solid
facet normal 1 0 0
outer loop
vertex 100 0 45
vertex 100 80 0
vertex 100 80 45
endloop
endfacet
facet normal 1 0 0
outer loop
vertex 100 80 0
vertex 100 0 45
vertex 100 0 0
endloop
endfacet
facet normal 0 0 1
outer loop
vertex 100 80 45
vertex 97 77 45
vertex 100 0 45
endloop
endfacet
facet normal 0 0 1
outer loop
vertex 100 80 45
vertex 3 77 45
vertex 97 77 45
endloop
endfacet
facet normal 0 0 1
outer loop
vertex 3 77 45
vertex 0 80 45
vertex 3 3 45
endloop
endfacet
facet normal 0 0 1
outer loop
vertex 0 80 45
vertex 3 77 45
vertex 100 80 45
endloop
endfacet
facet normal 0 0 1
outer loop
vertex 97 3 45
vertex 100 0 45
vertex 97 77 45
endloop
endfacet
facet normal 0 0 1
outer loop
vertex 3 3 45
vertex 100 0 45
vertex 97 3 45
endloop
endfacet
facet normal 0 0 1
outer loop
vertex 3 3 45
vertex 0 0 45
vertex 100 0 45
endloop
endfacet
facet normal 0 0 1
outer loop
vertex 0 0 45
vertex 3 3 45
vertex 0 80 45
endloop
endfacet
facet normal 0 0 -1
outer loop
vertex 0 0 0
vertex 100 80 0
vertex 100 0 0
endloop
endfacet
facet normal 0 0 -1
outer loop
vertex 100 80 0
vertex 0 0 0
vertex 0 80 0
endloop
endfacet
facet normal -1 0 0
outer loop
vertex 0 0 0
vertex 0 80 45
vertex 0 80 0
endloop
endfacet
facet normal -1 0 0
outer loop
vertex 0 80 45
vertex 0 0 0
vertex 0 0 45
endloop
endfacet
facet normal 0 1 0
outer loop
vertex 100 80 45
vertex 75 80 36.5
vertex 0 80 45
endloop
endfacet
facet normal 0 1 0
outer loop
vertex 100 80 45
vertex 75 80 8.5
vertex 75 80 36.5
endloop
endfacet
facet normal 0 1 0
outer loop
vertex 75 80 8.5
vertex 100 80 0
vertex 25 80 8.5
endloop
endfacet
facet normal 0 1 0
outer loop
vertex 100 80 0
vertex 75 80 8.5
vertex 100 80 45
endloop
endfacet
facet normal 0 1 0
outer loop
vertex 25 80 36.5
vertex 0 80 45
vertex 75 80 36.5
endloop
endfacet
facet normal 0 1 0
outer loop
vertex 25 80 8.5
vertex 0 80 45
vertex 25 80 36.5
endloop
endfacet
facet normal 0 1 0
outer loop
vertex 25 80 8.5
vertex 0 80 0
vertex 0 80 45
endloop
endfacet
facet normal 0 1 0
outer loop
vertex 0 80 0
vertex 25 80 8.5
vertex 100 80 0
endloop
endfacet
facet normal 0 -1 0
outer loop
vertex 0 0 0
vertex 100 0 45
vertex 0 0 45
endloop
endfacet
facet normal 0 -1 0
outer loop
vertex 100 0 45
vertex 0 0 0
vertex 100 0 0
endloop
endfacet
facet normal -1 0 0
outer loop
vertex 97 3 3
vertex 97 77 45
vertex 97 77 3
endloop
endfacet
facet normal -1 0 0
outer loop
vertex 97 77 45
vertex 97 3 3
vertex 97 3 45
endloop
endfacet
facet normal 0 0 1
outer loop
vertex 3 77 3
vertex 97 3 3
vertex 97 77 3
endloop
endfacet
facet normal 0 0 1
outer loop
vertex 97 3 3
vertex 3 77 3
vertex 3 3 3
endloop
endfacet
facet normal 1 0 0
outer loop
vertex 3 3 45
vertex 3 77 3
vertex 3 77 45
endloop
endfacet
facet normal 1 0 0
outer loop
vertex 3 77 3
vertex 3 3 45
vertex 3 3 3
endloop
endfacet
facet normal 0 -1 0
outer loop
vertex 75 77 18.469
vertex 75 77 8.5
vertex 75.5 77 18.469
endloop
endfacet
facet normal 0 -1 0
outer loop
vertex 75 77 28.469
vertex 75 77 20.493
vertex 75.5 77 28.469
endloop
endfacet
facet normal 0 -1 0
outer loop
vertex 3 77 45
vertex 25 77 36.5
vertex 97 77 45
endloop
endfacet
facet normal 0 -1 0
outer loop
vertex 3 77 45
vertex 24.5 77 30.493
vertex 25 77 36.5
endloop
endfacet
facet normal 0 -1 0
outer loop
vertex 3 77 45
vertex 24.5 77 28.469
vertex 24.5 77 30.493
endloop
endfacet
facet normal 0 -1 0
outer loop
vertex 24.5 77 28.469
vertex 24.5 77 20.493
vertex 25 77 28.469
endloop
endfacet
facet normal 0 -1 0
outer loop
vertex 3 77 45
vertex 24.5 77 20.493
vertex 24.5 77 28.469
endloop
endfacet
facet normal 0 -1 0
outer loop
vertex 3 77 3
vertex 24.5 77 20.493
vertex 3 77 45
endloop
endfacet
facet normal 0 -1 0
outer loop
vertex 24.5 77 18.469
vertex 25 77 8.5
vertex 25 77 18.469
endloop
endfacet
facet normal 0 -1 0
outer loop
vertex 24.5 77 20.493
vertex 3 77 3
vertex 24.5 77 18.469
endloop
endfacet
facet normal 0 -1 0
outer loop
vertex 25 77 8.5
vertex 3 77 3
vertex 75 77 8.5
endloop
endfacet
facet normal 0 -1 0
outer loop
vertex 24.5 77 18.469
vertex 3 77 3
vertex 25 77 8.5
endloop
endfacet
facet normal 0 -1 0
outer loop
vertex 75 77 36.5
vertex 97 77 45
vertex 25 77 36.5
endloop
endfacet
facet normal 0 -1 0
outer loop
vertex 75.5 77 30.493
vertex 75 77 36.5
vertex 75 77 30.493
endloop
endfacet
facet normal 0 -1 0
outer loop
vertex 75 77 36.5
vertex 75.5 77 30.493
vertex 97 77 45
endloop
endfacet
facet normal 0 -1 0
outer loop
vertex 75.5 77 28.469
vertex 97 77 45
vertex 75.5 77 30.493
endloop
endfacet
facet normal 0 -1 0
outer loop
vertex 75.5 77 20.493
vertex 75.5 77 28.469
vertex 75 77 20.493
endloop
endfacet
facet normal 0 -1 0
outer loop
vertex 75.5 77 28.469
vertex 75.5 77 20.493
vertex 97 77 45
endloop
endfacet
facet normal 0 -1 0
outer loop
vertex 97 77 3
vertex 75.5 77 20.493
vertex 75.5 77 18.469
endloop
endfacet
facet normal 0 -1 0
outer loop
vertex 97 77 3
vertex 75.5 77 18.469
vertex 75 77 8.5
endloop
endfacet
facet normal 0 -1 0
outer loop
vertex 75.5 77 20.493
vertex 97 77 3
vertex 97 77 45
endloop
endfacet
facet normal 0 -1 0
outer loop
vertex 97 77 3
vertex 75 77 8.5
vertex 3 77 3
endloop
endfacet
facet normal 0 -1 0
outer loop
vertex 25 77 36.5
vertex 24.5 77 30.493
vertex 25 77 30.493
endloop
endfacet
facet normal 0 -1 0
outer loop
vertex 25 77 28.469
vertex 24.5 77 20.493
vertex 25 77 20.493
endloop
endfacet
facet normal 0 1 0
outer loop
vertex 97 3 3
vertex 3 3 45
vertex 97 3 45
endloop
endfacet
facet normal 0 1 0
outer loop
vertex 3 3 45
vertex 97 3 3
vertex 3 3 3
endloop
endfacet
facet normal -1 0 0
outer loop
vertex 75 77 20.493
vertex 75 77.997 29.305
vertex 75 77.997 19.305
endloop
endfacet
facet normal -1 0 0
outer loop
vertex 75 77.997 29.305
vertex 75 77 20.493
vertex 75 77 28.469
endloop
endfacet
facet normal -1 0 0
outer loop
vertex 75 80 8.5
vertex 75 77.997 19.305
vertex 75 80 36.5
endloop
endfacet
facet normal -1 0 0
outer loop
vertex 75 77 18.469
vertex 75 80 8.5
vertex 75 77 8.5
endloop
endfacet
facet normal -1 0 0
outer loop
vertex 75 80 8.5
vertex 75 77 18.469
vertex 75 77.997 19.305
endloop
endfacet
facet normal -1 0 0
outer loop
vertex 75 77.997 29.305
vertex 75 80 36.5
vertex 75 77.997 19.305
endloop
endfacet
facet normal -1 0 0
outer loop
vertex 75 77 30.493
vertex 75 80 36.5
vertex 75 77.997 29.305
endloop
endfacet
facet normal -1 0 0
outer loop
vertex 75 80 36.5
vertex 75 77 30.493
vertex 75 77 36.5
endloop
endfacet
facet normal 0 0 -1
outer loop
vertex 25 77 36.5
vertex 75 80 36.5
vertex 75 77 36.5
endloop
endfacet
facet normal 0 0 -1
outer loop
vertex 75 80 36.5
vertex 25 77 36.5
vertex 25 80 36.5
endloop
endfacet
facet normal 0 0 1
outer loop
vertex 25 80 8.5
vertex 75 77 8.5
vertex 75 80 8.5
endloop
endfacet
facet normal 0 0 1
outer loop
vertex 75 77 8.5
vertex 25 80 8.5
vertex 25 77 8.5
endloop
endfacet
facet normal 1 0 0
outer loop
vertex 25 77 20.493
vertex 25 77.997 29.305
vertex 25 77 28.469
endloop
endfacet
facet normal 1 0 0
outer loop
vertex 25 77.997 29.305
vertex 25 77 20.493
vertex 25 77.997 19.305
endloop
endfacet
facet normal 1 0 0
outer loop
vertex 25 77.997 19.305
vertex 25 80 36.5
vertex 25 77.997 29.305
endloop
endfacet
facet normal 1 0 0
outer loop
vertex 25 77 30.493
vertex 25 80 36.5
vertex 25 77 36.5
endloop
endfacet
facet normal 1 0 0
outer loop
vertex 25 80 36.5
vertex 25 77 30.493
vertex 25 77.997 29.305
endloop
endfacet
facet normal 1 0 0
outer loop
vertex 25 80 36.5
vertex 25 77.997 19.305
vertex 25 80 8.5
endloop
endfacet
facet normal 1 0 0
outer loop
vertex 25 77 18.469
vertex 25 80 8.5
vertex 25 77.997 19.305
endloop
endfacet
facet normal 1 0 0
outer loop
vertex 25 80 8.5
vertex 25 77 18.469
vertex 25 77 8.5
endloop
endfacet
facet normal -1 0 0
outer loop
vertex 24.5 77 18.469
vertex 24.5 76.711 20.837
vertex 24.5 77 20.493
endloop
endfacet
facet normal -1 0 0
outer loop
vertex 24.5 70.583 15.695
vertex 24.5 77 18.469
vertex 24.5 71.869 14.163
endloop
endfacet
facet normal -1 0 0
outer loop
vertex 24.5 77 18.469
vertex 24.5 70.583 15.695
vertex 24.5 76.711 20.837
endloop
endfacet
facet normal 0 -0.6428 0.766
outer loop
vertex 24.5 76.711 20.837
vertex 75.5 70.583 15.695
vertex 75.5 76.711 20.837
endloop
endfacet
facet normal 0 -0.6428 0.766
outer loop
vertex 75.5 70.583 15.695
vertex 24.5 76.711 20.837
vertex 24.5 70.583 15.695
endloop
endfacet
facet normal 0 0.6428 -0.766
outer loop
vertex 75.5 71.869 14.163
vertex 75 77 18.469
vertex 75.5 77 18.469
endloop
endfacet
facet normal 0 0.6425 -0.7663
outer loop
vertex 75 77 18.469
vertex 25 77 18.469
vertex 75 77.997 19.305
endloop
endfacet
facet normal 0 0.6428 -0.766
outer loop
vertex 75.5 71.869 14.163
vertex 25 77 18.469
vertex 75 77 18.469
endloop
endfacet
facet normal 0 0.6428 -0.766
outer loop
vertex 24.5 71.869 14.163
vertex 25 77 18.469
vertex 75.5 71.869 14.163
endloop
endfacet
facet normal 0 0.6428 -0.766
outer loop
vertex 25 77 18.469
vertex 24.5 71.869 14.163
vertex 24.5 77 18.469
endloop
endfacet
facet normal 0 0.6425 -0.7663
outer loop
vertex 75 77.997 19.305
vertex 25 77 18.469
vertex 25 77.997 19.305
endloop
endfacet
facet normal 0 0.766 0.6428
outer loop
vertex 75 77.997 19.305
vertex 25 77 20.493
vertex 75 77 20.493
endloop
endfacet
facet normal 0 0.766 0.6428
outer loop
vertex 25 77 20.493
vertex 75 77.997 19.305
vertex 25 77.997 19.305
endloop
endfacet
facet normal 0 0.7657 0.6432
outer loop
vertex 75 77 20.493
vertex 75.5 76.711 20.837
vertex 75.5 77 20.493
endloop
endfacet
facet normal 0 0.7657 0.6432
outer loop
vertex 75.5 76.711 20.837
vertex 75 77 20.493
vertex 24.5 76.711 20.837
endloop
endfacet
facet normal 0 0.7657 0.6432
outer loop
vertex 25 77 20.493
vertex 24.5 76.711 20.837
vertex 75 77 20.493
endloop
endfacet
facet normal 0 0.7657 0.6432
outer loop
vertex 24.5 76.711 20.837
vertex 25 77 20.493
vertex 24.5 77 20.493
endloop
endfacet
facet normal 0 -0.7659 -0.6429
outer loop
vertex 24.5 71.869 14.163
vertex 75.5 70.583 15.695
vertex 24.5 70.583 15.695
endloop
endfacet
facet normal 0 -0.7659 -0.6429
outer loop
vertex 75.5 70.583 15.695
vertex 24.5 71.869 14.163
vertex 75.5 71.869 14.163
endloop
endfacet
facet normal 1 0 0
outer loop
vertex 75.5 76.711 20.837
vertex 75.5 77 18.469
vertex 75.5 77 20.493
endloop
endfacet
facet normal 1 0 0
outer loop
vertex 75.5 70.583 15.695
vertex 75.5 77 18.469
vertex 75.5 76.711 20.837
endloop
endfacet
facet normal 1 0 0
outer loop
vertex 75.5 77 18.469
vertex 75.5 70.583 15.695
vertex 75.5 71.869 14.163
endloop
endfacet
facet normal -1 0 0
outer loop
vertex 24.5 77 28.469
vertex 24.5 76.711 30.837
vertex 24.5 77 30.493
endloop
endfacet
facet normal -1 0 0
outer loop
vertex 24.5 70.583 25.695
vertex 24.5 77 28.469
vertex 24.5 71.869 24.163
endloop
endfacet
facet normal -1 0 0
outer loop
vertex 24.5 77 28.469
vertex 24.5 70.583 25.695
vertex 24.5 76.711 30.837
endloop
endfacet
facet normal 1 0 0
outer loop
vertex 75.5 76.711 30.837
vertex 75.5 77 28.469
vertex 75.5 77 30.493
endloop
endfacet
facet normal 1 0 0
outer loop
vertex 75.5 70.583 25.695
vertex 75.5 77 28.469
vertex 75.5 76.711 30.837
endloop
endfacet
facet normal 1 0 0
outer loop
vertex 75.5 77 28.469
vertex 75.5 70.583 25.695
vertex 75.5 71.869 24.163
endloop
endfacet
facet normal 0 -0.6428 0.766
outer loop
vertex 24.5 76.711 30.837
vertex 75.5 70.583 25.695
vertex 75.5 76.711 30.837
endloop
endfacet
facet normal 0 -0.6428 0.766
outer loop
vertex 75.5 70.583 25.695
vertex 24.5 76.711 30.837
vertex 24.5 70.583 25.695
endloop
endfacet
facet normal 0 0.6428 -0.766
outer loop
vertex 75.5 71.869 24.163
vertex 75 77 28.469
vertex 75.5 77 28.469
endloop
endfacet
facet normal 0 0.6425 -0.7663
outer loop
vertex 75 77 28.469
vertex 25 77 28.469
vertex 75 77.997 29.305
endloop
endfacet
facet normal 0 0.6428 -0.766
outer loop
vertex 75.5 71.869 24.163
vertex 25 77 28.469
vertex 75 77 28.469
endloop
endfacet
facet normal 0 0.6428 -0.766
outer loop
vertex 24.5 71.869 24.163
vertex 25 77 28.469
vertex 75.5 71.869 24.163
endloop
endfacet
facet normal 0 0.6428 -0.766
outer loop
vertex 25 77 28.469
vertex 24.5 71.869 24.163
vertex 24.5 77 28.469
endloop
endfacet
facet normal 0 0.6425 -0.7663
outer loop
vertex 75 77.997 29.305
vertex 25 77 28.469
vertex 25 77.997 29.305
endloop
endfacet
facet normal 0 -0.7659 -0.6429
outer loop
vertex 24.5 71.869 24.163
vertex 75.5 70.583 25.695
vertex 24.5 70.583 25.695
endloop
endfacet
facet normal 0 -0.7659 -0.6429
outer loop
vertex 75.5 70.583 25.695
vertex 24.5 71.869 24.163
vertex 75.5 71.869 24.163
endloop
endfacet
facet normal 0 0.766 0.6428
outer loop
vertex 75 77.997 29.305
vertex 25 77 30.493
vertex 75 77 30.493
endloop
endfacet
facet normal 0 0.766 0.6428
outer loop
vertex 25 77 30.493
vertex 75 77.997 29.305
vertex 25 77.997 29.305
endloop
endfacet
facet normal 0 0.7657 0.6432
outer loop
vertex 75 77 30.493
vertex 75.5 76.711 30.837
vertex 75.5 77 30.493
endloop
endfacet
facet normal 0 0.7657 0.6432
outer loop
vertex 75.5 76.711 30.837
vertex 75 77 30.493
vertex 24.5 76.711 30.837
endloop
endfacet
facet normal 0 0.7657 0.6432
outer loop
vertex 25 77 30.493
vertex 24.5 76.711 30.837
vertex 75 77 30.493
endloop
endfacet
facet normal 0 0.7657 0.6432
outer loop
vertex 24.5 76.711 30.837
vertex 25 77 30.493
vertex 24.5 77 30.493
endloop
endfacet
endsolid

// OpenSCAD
$fn = 32;

// ----------------------------------------------------------------------
// Vent box: louvers enclosure
// ----------------------------------------------------------------------

// --- parameters (mm) ---
box_l = 100;              // box length, X
box_w = 80;               // box width, Y
box_h = 45;               // box height, Z
wall_t = 3;               // shell wall thickness
win_l = 50;               // vent window width, X
win_h = 28;               // vent window height, Z
slat_t = 2;               // louver slat thickness
slat_d = 8;               // louver slat depth
slat_a = 40;              // louver slat angle, degrees
slat_pitch = 10;          // louver pitch
slat_yc = 74.29;          // slat centreline Y

win_z0 = (box_h - win_h) / 2;  // window lower edge Z
n_slats = 2;  // louver count
slat_z0 = win_z0 + (win_h - (n_slats - 1) * slat_pitch) / 2;

difference() {
  union() {
    difference() {
      cube([box_l, box_w, box_h]);
  translate([wall_t, wall_t, wall_t])
    cube([box_l - 2 * wall_t, box_w - 2 * wall_t, box_h]);
  translate([(box_l - win_l) / 2, box_w - wall_t - 1, win_z0])
    cube([win_l, wall_t + 2, win_h]);
    }
    for (i = [0 : n_slats - 1])
      translate([box_l / 2, slat_yc, slat_z0 + i * slat_pitch])
        rotate([slat_a, 0, 0])
          cube([win_l + 1, slat_d, slat_t], center = true);
  }
}
